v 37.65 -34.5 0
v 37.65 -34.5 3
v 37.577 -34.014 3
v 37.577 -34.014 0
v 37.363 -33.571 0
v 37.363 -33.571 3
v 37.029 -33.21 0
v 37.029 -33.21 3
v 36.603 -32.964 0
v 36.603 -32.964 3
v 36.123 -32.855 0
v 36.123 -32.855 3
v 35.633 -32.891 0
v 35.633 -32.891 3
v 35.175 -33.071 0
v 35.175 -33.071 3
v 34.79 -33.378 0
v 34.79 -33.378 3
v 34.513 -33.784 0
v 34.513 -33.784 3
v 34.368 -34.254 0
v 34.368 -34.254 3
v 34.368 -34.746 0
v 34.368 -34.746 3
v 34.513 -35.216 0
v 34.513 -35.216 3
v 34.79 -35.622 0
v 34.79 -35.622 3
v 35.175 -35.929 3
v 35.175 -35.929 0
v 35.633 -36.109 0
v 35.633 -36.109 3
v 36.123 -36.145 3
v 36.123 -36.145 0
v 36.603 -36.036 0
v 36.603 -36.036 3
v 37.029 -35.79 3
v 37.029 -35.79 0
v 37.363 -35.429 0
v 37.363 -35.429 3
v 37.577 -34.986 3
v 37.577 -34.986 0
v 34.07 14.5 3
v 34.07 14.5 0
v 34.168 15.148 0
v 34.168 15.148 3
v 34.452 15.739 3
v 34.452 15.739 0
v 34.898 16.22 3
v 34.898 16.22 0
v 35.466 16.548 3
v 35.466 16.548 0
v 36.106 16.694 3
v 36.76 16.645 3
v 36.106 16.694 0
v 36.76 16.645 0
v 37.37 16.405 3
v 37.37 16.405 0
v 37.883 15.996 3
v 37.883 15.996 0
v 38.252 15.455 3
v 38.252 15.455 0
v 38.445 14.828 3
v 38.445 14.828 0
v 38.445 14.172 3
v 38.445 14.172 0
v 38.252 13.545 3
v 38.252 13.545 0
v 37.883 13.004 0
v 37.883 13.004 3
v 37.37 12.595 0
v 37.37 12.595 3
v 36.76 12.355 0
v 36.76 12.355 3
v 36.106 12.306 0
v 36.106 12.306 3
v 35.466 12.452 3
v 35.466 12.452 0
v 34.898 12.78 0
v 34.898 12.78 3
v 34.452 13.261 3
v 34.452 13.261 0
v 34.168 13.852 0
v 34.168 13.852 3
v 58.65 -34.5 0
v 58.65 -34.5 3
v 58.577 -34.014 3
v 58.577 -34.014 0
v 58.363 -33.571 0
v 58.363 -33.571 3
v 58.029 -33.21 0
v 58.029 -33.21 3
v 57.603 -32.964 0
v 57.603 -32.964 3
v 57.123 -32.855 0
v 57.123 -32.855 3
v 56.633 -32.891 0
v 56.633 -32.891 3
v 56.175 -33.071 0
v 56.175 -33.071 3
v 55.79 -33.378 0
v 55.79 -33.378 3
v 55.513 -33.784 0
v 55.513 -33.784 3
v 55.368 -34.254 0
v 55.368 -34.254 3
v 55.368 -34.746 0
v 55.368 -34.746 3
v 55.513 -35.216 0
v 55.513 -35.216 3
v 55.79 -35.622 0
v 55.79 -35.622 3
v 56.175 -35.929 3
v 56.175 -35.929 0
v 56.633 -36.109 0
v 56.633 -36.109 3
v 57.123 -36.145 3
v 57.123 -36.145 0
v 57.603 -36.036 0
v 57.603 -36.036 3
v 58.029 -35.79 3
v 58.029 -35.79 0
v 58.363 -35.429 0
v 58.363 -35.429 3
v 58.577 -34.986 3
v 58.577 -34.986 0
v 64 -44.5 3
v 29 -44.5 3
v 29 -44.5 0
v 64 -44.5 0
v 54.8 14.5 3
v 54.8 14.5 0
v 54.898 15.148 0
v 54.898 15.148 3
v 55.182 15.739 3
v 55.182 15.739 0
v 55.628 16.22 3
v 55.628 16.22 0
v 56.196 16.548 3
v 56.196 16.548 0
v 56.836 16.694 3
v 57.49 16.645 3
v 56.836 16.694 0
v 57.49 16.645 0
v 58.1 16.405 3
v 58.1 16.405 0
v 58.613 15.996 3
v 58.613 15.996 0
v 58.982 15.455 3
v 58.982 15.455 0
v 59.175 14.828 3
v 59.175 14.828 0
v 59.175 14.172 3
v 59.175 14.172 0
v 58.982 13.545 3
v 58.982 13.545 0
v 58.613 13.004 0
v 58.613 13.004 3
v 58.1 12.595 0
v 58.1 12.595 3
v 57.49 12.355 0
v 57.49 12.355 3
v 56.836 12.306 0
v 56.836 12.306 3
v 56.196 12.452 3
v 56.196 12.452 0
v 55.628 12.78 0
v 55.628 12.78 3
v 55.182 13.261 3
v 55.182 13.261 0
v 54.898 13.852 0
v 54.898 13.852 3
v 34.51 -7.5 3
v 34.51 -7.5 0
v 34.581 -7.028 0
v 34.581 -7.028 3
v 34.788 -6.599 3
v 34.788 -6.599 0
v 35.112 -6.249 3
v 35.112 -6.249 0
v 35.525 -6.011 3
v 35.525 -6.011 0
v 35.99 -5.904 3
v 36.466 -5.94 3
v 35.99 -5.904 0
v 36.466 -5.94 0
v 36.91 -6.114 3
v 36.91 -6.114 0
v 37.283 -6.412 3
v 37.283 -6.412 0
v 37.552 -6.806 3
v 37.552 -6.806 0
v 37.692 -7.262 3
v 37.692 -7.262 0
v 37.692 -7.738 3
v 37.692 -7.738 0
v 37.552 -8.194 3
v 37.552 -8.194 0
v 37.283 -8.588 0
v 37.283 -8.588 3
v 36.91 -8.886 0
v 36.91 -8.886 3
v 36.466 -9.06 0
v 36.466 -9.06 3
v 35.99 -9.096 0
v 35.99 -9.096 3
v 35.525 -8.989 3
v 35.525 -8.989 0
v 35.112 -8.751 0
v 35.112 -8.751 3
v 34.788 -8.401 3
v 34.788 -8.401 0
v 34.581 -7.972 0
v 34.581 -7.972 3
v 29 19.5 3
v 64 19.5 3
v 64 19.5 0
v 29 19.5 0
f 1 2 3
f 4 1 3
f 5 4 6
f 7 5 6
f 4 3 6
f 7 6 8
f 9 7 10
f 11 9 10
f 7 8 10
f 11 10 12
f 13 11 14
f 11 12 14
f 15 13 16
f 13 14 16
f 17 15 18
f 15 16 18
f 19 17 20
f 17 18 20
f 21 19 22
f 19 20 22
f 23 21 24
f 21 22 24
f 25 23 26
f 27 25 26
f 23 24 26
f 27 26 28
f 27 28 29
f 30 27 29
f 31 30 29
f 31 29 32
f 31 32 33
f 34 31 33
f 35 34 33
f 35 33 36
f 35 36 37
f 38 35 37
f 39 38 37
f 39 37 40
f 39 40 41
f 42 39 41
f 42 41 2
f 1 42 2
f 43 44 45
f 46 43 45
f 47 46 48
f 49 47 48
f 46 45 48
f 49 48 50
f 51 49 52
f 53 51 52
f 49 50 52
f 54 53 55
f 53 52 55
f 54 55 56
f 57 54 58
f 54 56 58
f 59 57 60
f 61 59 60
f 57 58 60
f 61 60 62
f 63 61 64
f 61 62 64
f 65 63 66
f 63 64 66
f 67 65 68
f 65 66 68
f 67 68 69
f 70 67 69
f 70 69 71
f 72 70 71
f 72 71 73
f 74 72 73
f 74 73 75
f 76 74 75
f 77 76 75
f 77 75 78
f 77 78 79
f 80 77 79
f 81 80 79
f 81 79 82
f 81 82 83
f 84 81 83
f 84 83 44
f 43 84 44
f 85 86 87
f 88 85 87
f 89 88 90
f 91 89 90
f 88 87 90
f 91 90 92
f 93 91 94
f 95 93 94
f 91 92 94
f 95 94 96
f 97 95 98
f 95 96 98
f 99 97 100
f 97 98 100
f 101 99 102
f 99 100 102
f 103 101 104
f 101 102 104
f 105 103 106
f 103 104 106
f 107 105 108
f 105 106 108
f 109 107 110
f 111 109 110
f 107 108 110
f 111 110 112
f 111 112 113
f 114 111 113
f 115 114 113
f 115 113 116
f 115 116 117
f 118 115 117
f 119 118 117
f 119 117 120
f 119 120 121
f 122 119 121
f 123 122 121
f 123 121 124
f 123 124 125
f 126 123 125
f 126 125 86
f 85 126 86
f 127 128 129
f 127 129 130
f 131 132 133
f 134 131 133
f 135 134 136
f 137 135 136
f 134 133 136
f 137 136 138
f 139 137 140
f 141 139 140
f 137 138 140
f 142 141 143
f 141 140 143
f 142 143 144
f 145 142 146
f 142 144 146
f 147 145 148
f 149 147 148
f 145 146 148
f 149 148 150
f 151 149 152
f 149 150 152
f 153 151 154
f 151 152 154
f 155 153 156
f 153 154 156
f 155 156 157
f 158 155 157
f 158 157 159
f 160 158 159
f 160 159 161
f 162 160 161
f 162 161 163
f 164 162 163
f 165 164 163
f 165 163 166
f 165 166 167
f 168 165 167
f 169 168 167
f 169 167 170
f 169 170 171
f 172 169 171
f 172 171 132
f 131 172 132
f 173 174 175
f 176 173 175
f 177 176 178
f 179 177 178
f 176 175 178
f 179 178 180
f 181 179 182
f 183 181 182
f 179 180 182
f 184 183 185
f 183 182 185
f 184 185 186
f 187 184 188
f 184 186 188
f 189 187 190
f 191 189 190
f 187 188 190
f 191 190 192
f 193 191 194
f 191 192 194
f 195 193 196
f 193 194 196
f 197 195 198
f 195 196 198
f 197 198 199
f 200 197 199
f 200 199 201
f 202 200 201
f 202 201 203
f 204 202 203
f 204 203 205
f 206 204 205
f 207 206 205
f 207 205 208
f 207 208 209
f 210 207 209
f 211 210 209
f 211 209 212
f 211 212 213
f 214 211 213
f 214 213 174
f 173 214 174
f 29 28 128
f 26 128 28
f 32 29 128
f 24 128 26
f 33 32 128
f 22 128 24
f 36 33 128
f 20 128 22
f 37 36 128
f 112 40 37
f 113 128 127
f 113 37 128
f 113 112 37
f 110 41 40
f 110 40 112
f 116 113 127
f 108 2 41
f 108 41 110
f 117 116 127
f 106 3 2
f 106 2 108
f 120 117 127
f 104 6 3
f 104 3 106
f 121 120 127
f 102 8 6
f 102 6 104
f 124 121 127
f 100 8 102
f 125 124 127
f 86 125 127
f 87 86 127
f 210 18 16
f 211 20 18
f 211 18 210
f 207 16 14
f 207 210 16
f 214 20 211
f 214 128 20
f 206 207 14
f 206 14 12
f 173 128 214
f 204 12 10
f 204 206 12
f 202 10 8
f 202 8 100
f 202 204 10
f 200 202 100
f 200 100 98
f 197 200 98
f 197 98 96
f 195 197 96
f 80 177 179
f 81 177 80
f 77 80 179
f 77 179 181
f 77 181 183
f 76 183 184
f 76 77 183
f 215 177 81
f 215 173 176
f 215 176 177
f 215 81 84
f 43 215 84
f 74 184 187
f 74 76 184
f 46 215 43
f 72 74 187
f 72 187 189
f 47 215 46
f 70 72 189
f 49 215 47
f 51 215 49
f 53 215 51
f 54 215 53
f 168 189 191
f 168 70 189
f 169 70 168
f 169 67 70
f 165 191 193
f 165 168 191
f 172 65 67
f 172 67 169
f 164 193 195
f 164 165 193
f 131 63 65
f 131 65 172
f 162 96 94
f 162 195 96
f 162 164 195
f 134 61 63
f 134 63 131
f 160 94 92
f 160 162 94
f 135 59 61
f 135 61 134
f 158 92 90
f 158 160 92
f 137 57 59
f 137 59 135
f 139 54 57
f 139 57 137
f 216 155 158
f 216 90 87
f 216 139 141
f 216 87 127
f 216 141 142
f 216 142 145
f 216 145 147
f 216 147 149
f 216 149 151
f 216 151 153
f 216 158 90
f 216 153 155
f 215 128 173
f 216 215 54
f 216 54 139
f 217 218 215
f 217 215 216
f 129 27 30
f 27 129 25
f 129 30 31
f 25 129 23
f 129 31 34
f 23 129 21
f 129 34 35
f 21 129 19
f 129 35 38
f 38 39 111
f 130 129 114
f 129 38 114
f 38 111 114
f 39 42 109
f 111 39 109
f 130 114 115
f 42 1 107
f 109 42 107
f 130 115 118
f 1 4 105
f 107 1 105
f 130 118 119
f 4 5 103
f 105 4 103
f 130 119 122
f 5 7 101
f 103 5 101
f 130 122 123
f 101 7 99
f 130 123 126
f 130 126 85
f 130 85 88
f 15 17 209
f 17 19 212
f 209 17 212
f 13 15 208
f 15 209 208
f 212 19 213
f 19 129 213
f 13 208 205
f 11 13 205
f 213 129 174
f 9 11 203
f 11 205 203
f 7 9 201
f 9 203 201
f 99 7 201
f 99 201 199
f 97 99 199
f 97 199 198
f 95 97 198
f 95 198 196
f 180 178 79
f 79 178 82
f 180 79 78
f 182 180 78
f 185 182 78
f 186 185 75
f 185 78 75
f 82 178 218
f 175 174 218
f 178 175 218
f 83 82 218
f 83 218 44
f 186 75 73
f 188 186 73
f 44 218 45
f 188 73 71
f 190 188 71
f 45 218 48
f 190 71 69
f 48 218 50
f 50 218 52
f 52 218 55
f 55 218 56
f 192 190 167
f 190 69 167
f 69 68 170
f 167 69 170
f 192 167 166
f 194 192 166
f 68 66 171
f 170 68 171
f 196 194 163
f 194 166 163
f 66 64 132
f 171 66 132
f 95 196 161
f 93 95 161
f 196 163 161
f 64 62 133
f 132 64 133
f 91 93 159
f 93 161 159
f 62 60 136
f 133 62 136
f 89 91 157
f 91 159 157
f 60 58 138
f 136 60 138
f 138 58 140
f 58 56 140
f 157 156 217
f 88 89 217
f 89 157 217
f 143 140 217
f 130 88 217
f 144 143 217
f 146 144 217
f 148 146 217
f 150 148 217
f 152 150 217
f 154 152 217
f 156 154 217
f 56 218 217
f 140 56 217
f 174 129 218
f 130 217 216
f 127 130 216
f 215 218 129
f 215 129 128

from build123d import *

# Parameters (mm, degrees)
SKETCH_1_W           = 40
SKETCH_1_H           = 29
EXTRUDE_1_DEPTH      = 3
CUT_EXTRUDE_1_DEPTH  = 3
SKETCH_3_W           = 40
SKETCH_3_H           = 3
EXTRUDE_2_DEPTH      = 10
SKETCH_4_W           = 40
SKETCH_4_H           = 3
EXTRUDE_3_DEPTH      = 10
SKETCH_6_W           = 3
SKETCH_6_H           = 49
EXTRUDE_5_DEPTH      = 42
SKETCH_8_W           = 3
SKETCH_8_H           = 49
EXTRUDE_6_DEPTH      = 2
SKETCH_9_W           = 3
SKETCH_9_H           = 49
EXTRUDE_7_DEPTH      = 2
SKETCH_10_W          = 86
SKETCH_10_H          = 3
EXTRUDE_8_DEPTH      = 10
SKETCH_11_W          = 86
SKETCH_11_H          = 3
EXTRUDE_9_DEPTH      = 10
SKETCH_14_W          = 3
SKETCH_14_H          = 69
CUT_EXTRUDE_5_DEPTH  = 43
SKETCH_17_W          = 43
SKETCH_17_H          = 3
EXTRUDE_10_DEPTH     = 20
SKETCH_20_W          = 43
SKETCH_20_H          = 3
EXTRUDE_11_DEPTH     = 10
SKETCH_21_W          = 43
SKETCH_21_H          = 3
CUT_EXTRUDE_7_DEPTH  = 20
SKETCH_24_R          = 2.2
CUT_EXTRUDE_8_DEPTH  = 30
SKETCH_26_R          = 1.6
CUT_EXTRUDE_9_DEPTH  = 10
SKETCH_27_W          = 3
SKETCH_27_H          = 79
CUT_EXTRUDE_10_DEPTH = 8
SKETCH_28_W          = 35
SKETCH_28_H          = 3
CUT_EXTRUDE_11_DEPTH = 15
CUT_EXTRUDE_13_DEPTH = 10
M4X0_7_3_D           = 3.3


with BuildPart() as part:
    # ｽｹｯﾁ1 → ﾎﾞｽ - 押し出し1 (new body)
    with BuildSketch(Plane.XY):
        Rectangle(SKETCH_1_W, SKETCH_1_H)
    extrude(amount=EXTRUDE_1_DEPTH)

    # ｽｹｯﾁ2 → ｶｯﾄ - 押し出し1 (cut)
    with BuildSketch(Plane.XY.offset(3)):
        with BuildLine():
            ThreePointArc((-14.4, 10.5), (-15.01507576, 11.98492424), (-16.5, 12.6))
            Line((-16.5, 12.6), (-16.5, 10.5))
            Line((-16.5, 10.5), (-18.6, 10.5))
            ThreePointArc((-18.6, 10.5), (-16.5, 8.4), (-14.4, 10.5))
        make_face()
        with BuildLine():
            Line((-16.5, 10.5), (-16.5, 12.6))
            ThreePointArc((-16.5, 12.6), (-17.98492424, 11.98492424), (-18.6, 10.5))
            Line((-18.6, 10.5), (-16.5, 10.5))
        make_face()
        with BuildLine():
            ThreePointArc((-18.6, -10.5), (-17.98492424, -11.98492424), (-16.5, -12.6))
            Line((-16.5, -12.6), (-16.5, -10.5))
            Line((-16.5, -10.5), (-18.6, -10.5))
        make_face()
        with BuildLine():
            Line((-16.5, -10.5), (-16.5, -12.6))
            ThreePointArc((-16.5, -12.6), (-15.01507576, -11.98492424), (-14.4, -10.5))
            ThreePointArc((-14.4, -10.5), (-16.5, -8.4), (-18.6, -10.5))
            Line((-18.6, -10.5), (-16.5, -10.5))
        make_face()
        with BuildLine():
            ThreePointArc((18.6, -10.5), (15.01507576, -9.01507576), (16.5, -12.6))
            Line((16.5, -12.6), (16.5, -10.5))
            Line((16.5, -10.5), (18.6, -10.5))
        make_face()
        with BuildLine():
            Line((16.5, -10.5), (16.5, -12.6))
            ThreePointArc((16.5, -12.6), (17.98492424, -11.98492424), (18.6, -10.5))
            Line((18.6, -10.5), (16.5, -10.5))
        make_face()
        with BuildLine():
            ThreePointArc((18.6, 10.5), (17.98492424, 11.98492424), (16.5, 12.6))
            Line((16.5, 12.6), (16.5, 10.5))
            Line((16.5, 10.5), (18.6, 10.5))
        make_face()
        with BuildLine():
            Line((16.5, 10.5), (16.5, 12.6))
            ThreePointArc((16.5, 12.6), (15.01507576, 9.01507576), (18.6, 10.5))
            Line((18.6, 10.5), (16.5, 10.5))
        make_face()
    extrude(amount=-CUT_EXTRUDE_1_DEPTH, mode=Mode.SUBTRACT)

    # ｽｹｯﾁ3 → ﾎﾞｽ - 押し出し2 (add)
    with BuildSketch(Plane.XZ.offset(14.5)):
        with Locations((0, 1.5)):
            Rectangle(SKETCH_3_W, SKETCH_3_H)
    extrude(amount=EXTRUDE_2_DEPTH)

    # ｽｹｯﾁ4 → ﾎﾞｽ - 押し出し3 (add)
    with BuildSketch(Plane(origin=(0, 14.5, 0), x_dir=(1, 0, 0), z_dir=(0, 1, 0))):
        with Locations((0, -1.5)):
            Rectangle(SKETCH_4_W, SKETCH_4_H)
    extrude(amount=EXTRUDE_3_DEPTH)

    # ｽｹｯﾁ6 → ﾎﾞｽ - 押し出し5 (add)
    with BuildSketch(Plane(origin=(20, 0, 0), x_dir=(0, 0, -1), z_dir=(1, 0, 0))):
        with Locations((-1.5, 0)):
            Rectangle(SKETCH_6_W, SKETCH_6_H)
    extrude(amount=EXTRUDE_5_DEPTH)

    # ｽｹｯﾁ8 → ﾎﾞｽ - 押し出し6 (add)
    with BuildSketch(Plane.ZY.offset(20)):
        with Locations((1.5, 0)):
            Rectangle(SKETCH_8_W, SKETCH_8_H)
    extrude(amount=EXTRUDE_6_DEPTH)

    # ｽｹｯﾁ9 → ﾎﾞｽ - 押し出し7 (add)
    with BuildSketch(Plane(origin=(62, 0, 0), x_dir=(0, 0, -1), z_dir=(1, 0, 0))):
        with Locations((-1.5, 0)):
            Rectangle(SKETCH_9_W, SKETCH_9_H)
    extrude(amount=EXTRUDE_7_DEPTH)

    # ｽｹｯﾁ10 → ﾎﾞｽ - 押し出し8 (add)
    with BuildSketch(Plane.XZ.offset(24.5)):
        with Locations((21, 1.5)):
            Rectangle(SKETCH_10_W, SKETCH_10_H)
    extrude(amount=EXTRUDE_8_DEPTH)

    # ｽｹｯﾁ11 → ﾎﾞｽ - 押し出し9 (add)
    with BuildSketch(Plane(origin=(0, 24.5, 0), x_dir=(1, 0, 0), z_dir=(0, 1, 0))):
        with Locations((21, -1.5)):
            Rectangle(SKETCH_11_W, SKETCH_11_H)
    extrude(amount=EXTRUDE_9_DEPTH)

    # ｽｹｯﾁ14 → ｶｯﾄ - 押し出し5 (cut)
    with BuildSketch(Plane.ZY.offset(22)):
        with Locations((1.5, 0)):
            Rectangle(SKETCH_14_W, SKETCH_14_H)
    extrude(amount=-CUT_EXTRUDE_5_DEPTH, mode=Mode.SUBTRACT)

    # ｽｹｯﾁ17 → ﾎﾞｽ - 押し出し10 (add)
    with BuildSketch(Plane.XZ.offset(34.5)):
        with Locations((42.5, 1.5)):
            Rectangle(SKETCH_17_W, SKETCH_17_H)
    extrude(amount=EXTRUDE_10_DEPTH)

    # ｽｹｯﾁ20 → ﾎﾞｽ - 押し出し11 (add)
    with BuildSketch(Plane.XZ.offset(54.5)):
        with Locations((42.5, 1.5)):
            Rectangle(SKETCH_20_W, SKETCH_20_H)
    extrude(amount=EXTRUDE_11_DEPTH)

    # ｽｹｯﾁ21 → ｶｯﾄ - 押し出し7 (cut)
    with BuildSketch(Plane.XZ.offset(64.5)):
        with Locations((42.5, 1.5)):
            Rectangle(SKETCH_21_W, SKETCH_21_H)
    extrude(amount=-CUT_EXTRUDE_7_DEPTH, mode=Mode.SUBTRACT)

    # ｽｹｯﾁ24 → ｶｯﾄ - 押し出し8 (cut)
    with BuildSketch(Plane(origin=(0, 0, 0), x_dir=(-1, 0, 0), z_dir=(0, 0, -1))):
        with Locations((-36.27, 14.5)):
            Circle(SKETCH_24_R)
        with Locations((-57, 14.5)):
            Circle(SKETCH_24_R)
    extrude(amount=-CUT_EXTRUDE_8_DEPTH, mode=Mode.SUBTRACT)

    # ｽｹｯﾁ26 → ｶｯﾄ - 押し出し9 (cut)
    with BuildSketch(Plane(origin=(0, 0, 0), x_dir=(-1, 0, 0), z_dir=(0, 0, -1))):
        with Locations((-36.11, -7.5)):
            Circle(SKETCH_26_R)
    extrude(amount=-CUT_EXTRUDE_9_DEPTH, mode=Mode.SUBTRACT)

    # ｽｹｯﾁ27 → ｶｯﾄ - 押し出し10 (cut)
    with BuildSketch(Plane.ZY.offset(-21)):
        with Locations((1.5, -5)):
            Rectangle(SKETCH_27_W, SKETCH_27_H)
    extrude(amount=-CUT_EXTRUDE_10_DEPTH, mode=Mode.SUBTRACT)

    # ｽｹｯﾁ28 → ｶｯﾄ - 押し出し11 (cut)
    with BuildSketch(Plane(origin=(0, 34.5, 0), x_dir=(1, 0, 0), z_dir=(0, 1, 0))):
        with Locations((46.5, -1.5)):
            Rectangle(SKETCH_28_W, SKETCH_28_H)
    extrude(amount=-CUT_EXTRUDE_11_DEPTH, mode=Mode.SUBTRACT)

    # ｽｹｯﾁ33 → ｶｯﾄ - 押し出し13 (cut)
    with BuildSketch(Plane(origin=(0, 0, 0), x_dir=(-1, 0, 0), z_dir=(0, 0, -1))):
        with BuildLine():
            ThreePointArc((-35, -34.5), (-36.707106781, -33.792893219), (-36, -35.5))
            Line((-36, -35.5), (-36, -34.5))
            Line((-36, -34.5), (-35, -34.5))
        make_face()
        with BuildLine():
            Line((-36, -34.5), (-36, -35.5))
            ThreePointArc((-36, -35.5), (-35.292893219, -35.207106781), (-35, -34.5))
            Line((-35, -34.5), (-36, -34.5))
        make_face()
        with BuildLine():
            ThreePointArc((-58, -34.5), (-57.707106781, -35.207106781), (-57, -35.5))
            Line((-57, -35.5), (-57, -34.5))
            Line((-57, -34.5), (-58, -34.5))
        make_face()
        with BuildLine():
            Line((-57, -34.5), (-57, -35.5))
            ThreePointArc((-57, -35.5), (-56.292893219, -35.207106781), (-56, -34.5))
            ThreePointArc((-56, -34.5), (-57, -33.5), (-58, -34.5))
            Line((-58, -34.5), (-57, -34.5))
        make_face()
    extrude(amount=-CUT_EXTRUDE_13_DEPTH, mode=Mode.SUBTRACT)

    # M4x0.7 ねじ穴3 (through all)
    with Locations(Plane(origin=(36, -34.5, 0), x_dir=(-1, 0, 0), z_dir=(0, 0, -1))):
        with Locations((0, 0), (-21, 0)):
            Hole(M4X0_7_3_D / 2)


solid = part.part
